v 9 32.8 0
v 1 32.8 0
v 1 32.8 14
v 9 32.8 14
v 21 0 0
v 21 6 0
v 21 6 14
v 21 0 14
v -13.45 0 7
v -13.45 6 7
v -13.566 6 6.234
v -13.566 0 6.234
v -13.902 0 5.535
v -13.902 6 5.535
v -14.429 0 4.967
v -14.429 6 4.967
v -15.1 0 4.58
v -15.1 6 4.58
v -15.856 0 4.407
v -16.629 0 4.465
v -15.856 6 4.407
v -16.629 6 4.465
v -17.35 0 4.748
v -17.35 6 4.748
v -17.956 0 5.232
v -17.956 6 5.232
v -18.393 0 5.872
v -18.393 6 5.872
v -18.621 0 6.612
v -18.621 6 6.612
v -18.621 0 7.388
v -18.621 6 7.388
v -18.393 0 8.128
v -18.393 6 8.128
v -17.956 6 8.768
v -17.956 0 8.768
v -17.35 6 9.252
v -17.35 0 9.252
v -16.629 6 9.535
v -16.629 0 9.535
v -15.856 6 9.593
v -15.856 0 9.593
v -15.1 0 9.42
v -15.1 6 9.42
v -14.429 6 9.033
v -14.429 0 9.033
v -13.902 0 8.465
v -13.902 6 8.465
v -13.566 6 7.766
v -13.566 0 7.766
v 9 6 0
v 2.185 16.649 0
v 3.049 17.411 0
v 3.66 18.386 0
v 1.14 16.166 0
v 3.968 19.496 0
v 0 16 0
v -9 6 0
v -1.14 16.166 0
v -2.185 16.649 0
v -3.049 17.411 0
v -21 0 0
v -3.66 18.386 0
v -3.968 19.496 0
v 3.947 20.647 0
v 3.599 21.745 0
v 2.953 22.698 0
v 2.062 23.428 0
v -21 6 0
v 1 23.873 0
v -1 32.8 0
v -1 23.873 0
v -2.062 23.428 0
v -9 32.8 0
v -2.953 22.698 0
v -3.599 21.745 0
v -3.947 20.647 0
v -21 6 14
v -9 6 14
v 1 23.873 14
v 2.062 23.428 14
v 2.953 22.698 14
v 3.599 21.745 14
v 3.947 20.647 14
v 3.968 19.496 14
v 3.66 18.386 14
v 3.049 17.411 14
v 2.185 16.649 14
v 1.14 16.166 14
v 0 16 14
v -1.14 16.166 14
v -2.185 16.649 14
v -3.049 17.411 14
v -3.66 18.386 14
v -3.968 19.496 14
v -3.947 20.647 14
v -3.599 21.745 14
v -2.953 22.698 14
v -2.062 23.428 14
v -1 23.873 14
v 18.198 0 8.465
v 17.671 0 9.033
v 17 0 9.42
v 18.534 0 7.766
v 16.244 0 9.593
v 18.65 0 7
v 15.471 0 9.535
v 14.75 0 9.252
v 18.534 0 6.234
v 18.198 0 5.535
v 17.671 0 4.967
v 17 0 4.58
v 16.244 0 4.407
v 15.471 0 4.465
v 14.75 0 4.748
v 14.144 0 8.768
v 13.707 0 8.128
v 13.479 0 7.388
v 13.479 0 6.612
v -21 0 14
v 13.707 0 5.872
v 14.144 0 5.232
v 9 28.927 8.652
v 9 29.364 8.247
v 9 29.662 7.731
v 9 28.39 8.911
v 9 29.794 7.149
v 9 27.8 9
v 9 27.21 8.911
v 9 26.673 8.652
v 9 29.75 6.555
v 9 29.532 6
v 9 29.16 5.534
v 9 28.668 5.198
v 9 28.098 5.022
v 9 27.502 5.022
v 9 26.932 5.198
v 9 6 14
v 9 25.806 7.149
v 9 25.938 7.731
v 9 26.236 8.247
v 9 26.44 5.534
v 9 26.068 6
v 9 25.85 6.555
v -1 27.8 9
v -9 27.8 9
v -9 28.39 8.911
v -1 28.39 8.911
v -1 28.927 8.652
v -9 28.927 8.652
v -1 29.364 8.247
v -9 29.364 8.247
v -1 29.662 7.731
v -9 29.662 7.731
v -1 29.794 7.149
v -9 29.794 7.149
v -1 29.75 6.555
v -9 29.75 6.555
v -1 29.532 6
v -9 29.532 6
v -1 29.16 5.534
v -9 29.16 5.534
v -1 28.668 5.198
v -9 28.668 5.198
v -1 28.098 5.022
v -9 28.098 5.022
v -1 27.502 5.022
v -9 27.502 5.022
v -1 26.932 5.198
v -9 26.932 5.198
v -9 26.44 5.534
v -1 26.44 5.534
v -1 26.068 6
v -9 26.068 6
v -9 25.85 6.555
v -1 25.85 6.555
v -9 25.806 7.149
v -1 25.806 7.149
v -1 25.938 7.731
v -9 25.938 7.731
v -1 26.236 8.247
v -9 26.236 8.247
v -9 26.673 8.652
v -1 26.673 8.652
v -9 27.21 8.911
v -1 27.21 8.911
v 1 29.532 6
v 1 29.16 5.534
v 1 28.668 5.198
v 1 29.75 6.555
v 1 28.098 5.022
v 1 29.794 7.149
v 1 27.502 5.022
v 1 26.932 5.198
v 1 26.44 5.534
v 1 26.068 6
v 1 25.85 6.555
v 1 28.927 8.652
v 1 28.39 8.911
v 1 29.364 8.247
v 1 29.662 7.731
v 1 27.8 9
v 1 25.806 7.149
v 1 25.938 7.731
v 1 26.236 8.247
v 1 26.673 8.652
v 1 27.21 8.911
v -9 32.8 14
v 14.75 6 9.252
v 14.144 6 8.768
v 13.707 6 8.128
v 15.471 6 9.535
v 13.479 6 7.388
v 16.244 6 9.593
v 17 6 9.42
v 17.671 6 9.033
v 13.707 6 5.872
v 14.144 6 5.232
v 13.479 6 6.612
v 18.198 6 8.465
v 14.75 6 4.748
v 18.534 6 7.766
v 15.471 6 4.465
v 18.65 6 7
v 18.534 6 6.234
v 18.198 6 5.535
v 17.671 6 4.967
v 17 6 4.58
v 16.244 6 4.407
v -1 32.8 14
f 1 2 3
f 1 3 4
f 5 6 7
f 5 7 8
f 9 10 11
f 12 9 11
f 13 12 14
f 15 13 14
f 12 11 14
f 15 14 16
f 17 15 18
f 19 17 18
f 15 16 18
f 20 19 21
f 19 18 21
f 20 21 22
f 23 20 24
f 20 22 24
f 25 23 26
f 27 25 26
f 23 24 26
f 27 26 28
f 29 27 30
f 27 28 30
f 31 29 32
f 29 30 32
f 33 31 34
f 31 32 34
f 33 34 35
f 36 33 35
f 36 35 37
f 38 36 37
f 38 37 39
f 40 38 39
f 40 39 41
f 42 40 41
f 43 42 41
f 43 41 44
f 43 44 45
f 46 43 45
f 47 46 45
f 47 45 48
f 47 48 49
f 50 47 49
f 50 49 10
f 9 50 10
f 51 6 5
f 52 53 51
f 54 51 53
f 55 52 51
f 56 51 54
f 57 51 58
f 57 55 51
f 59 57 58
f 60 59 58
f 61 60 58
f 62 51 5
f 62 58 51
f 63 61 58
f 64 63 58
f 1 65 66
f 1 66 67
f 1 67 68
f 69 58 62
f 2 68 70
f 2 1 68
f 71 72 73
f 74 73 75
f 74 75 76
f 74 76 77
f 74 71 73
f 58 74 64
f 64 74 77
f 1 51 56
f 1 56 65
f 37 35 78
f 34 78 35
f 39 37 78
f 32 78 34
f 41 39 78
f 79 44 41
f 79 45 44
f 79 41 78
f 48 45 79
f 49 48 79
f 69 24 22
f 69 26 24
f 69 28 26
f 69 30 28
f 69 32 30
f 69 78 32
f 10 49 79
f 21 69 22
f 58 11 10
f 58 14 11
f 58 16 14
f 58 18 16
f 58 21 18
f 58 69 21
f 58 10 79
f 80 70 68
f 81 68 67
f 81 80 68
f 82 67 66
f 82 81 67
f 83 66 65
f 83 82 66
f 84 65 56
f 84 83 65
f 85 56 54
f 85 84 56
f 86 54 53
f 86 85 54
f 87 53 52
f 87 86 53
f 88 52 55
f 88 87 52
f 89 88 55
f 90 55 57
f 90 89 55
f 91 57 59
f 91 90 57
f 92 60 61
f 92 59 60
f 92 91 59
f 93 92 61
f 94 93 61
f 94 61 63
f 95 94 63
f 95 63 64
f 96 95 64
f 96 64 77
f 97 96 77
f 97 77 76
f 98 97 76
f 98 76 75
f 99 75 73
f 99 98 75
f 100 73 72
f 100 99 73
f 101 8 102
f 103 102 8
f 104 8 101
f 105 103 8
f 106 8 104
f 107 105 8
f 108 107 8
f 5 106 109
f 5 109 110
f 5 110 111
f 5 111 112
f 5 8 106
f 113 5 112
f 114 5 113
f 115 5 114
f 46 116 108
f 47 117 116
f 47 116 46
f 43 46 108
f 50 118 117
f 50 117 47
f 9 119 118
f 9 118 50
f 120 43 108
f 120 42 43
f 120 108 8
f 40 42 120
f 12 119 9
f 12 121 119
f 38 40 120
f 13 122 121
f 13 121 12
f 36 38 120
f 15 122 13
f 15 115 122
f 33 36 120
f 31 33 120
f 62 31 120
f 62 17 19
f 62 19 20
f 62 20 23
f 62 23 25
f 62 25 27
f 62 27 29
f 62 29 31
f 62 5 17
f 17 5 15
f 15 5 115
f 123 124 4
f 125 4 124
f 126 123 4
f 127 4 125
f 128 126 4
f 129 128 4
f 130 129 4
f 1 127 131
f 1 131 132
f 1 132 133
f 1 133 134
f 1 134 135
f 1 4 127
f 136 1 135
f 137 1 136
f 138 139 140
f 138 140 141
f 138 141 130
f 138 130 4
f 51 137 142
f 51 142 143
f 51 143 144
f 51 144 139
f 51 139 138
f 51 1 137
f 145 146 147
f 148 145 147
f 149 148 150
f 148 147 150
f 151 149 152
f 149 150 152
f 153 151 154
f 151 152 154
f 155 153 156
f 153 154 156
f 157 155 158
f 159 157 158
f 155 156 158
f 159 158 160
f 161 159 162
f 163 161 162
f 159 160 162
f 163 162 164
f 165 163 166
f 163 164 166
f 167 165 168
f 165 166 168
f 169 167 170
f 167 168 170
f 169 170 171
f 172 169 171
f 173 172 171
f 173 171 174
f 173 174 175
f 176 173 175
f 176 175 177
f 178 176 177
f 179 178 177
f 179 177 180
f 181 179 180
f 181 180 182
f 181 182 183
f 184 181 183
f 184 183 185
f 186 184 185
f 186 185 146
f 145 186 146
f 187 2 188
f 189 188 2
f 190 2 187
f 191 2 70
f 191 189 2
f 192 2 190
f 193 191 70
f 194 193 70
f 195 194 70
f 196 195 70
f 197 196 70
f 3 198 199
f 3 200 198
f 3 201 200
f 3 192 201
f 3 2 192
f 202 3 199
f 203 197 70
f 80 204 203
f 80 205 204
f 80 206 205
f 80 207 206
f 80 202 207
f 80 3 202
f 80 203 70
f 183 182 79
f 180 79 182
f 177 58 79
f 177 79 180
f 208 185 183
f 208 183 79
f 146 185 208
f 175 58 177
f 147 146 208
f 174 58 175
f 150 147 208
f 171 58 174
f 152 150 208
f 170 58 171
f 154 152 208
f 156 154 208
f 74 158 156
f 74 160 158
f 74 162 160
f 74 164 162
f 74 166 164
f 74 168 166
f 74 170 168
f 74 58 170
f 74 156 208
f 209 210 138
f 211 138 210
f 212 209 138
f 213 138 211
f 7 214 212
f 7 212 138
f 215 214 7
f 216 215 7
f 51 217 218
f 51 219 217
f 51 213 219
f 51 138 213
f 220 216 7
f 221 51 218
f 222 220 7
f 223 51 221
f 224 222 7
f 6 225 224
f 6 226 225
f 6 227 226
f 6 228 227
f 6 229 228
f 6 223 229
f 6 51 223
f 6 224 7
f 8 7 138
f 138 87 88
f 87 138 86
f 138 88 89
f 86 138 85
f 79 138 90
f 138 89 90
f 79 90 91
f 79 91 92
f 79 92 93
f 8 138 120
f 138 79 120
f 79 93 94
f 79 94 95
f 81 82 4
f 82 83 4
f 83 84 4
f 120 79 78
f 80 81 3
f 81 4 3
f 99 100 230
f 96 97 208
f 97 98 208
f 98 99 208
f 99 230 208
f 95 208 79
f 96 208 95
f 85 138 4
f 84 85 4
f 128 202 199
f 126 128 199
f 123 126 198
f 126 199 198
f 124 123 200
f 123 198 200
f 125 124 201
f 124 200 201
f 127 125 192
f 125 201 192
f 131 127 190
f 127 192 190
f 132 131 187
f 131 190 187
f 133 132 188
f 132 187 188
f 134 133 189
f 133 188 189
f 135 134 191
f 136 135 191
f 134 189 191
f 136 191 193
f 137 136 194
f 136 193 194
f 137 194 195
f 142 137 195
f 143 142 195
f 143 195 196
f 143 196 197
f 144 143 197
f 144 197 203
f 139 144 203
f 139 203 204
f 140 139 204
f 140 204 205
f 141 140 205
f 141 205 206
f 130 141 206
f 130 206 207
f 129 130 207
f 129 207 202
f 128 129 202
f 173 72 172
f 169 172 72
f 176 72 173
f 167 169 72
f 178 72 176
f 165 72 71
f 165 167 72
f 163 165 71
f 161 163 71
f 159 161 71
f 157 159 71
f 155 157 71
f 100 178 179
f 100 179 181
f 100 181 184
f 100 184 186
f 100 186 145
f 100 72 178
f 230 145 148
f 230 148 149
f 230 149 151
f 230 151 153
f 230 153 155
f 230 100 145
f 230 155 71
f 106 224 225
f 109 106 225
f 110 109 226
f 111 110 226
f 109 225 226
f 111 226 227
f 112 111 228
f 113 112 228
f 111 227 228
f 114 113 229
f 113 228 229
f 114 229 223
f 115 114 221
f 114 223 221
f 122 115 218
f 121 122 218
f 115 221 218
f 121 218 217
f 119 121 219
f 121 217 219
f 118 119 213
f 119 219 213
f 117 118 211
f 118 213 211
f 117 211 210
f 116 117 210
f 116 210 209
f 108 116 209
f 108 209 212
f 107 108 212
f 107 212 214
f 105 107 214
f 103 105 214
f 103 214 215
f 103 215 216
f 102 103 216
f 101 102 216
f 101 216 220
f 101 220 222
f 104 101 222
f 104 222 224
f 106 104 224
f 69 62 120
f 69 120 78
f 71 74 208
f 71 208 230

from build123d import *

# Parameters (mm, degrees)
SALIENTE_EXTRUIR1_DEPTH = 14
CROQUIS2_R              = 2.6
CORTAR_EXTRUIR1_DEPTH   = 14
CORTAR_EXTRUIR2_DEPTH   = 15
CROQUIS4_R              = 2
CORTAR_EXTRUIR3_DEPTH   = 31


with BuildPart() as part:
    # Croquis1 → Saliente-Extruir1 (new body)
    with BuildSketch(Plane.XY):
        Polygon((-9, 6), (-9, 32.8), (9, 32.8), (9, 6), (21, 6), (21, 0), (-21, 0), (-21, 6), align=None)
    extrude(amount=SALIENTE_EXTRUIR1_DEPTH)

    # Croquis2 → Cortar-Extruir1 (cut)
    with BuildSketch(Plane(origin=(0, 6, 0), x_dir=(1, 0, 0), z_dir=(0, 1, 0))):
        with Locations((-16.05, -7)):
            Circle(CROQUIS2_R)
        with Locations((16.05, -7)):
            Circle(CROQUIS2_R)
    extrude(amount=-CORTAR_EXTRUIR1_DEPTH, mode=Mode.SUBTRACT)

    # Croquis3 → Cortar-Extruir2 (cut, through all)
    with BuildSketch(Plane.XY.offset(14)):
        with BuildLine():
            Line((-1, 23.872983346), (-1, 32.8))
            Line((-1, 32.8), (1, 32.8))
            Line((1, 32.8), (1, 23.872983346))
            ThreePointArc((1, 23.872983346), (0, 16), (-1, 23.872983346))
        make_face()
    extrude(amount=-CORTAR_EXTRUIR2_DEPTH, mode=Mode.SUBTRACT)

    # Croquis4 → Cortar-Extruir3 (cut, through all)
    with BuildSketch(Plane.ZY.offset(9)):
        with Locations((7, 27.8)):
            Circle(CROQUIS4_R)
    extrude(amount=-CORTAR_EXTRUIR3_DEPTH, mode=Mode.SUBTRACT)


solid = part.part
